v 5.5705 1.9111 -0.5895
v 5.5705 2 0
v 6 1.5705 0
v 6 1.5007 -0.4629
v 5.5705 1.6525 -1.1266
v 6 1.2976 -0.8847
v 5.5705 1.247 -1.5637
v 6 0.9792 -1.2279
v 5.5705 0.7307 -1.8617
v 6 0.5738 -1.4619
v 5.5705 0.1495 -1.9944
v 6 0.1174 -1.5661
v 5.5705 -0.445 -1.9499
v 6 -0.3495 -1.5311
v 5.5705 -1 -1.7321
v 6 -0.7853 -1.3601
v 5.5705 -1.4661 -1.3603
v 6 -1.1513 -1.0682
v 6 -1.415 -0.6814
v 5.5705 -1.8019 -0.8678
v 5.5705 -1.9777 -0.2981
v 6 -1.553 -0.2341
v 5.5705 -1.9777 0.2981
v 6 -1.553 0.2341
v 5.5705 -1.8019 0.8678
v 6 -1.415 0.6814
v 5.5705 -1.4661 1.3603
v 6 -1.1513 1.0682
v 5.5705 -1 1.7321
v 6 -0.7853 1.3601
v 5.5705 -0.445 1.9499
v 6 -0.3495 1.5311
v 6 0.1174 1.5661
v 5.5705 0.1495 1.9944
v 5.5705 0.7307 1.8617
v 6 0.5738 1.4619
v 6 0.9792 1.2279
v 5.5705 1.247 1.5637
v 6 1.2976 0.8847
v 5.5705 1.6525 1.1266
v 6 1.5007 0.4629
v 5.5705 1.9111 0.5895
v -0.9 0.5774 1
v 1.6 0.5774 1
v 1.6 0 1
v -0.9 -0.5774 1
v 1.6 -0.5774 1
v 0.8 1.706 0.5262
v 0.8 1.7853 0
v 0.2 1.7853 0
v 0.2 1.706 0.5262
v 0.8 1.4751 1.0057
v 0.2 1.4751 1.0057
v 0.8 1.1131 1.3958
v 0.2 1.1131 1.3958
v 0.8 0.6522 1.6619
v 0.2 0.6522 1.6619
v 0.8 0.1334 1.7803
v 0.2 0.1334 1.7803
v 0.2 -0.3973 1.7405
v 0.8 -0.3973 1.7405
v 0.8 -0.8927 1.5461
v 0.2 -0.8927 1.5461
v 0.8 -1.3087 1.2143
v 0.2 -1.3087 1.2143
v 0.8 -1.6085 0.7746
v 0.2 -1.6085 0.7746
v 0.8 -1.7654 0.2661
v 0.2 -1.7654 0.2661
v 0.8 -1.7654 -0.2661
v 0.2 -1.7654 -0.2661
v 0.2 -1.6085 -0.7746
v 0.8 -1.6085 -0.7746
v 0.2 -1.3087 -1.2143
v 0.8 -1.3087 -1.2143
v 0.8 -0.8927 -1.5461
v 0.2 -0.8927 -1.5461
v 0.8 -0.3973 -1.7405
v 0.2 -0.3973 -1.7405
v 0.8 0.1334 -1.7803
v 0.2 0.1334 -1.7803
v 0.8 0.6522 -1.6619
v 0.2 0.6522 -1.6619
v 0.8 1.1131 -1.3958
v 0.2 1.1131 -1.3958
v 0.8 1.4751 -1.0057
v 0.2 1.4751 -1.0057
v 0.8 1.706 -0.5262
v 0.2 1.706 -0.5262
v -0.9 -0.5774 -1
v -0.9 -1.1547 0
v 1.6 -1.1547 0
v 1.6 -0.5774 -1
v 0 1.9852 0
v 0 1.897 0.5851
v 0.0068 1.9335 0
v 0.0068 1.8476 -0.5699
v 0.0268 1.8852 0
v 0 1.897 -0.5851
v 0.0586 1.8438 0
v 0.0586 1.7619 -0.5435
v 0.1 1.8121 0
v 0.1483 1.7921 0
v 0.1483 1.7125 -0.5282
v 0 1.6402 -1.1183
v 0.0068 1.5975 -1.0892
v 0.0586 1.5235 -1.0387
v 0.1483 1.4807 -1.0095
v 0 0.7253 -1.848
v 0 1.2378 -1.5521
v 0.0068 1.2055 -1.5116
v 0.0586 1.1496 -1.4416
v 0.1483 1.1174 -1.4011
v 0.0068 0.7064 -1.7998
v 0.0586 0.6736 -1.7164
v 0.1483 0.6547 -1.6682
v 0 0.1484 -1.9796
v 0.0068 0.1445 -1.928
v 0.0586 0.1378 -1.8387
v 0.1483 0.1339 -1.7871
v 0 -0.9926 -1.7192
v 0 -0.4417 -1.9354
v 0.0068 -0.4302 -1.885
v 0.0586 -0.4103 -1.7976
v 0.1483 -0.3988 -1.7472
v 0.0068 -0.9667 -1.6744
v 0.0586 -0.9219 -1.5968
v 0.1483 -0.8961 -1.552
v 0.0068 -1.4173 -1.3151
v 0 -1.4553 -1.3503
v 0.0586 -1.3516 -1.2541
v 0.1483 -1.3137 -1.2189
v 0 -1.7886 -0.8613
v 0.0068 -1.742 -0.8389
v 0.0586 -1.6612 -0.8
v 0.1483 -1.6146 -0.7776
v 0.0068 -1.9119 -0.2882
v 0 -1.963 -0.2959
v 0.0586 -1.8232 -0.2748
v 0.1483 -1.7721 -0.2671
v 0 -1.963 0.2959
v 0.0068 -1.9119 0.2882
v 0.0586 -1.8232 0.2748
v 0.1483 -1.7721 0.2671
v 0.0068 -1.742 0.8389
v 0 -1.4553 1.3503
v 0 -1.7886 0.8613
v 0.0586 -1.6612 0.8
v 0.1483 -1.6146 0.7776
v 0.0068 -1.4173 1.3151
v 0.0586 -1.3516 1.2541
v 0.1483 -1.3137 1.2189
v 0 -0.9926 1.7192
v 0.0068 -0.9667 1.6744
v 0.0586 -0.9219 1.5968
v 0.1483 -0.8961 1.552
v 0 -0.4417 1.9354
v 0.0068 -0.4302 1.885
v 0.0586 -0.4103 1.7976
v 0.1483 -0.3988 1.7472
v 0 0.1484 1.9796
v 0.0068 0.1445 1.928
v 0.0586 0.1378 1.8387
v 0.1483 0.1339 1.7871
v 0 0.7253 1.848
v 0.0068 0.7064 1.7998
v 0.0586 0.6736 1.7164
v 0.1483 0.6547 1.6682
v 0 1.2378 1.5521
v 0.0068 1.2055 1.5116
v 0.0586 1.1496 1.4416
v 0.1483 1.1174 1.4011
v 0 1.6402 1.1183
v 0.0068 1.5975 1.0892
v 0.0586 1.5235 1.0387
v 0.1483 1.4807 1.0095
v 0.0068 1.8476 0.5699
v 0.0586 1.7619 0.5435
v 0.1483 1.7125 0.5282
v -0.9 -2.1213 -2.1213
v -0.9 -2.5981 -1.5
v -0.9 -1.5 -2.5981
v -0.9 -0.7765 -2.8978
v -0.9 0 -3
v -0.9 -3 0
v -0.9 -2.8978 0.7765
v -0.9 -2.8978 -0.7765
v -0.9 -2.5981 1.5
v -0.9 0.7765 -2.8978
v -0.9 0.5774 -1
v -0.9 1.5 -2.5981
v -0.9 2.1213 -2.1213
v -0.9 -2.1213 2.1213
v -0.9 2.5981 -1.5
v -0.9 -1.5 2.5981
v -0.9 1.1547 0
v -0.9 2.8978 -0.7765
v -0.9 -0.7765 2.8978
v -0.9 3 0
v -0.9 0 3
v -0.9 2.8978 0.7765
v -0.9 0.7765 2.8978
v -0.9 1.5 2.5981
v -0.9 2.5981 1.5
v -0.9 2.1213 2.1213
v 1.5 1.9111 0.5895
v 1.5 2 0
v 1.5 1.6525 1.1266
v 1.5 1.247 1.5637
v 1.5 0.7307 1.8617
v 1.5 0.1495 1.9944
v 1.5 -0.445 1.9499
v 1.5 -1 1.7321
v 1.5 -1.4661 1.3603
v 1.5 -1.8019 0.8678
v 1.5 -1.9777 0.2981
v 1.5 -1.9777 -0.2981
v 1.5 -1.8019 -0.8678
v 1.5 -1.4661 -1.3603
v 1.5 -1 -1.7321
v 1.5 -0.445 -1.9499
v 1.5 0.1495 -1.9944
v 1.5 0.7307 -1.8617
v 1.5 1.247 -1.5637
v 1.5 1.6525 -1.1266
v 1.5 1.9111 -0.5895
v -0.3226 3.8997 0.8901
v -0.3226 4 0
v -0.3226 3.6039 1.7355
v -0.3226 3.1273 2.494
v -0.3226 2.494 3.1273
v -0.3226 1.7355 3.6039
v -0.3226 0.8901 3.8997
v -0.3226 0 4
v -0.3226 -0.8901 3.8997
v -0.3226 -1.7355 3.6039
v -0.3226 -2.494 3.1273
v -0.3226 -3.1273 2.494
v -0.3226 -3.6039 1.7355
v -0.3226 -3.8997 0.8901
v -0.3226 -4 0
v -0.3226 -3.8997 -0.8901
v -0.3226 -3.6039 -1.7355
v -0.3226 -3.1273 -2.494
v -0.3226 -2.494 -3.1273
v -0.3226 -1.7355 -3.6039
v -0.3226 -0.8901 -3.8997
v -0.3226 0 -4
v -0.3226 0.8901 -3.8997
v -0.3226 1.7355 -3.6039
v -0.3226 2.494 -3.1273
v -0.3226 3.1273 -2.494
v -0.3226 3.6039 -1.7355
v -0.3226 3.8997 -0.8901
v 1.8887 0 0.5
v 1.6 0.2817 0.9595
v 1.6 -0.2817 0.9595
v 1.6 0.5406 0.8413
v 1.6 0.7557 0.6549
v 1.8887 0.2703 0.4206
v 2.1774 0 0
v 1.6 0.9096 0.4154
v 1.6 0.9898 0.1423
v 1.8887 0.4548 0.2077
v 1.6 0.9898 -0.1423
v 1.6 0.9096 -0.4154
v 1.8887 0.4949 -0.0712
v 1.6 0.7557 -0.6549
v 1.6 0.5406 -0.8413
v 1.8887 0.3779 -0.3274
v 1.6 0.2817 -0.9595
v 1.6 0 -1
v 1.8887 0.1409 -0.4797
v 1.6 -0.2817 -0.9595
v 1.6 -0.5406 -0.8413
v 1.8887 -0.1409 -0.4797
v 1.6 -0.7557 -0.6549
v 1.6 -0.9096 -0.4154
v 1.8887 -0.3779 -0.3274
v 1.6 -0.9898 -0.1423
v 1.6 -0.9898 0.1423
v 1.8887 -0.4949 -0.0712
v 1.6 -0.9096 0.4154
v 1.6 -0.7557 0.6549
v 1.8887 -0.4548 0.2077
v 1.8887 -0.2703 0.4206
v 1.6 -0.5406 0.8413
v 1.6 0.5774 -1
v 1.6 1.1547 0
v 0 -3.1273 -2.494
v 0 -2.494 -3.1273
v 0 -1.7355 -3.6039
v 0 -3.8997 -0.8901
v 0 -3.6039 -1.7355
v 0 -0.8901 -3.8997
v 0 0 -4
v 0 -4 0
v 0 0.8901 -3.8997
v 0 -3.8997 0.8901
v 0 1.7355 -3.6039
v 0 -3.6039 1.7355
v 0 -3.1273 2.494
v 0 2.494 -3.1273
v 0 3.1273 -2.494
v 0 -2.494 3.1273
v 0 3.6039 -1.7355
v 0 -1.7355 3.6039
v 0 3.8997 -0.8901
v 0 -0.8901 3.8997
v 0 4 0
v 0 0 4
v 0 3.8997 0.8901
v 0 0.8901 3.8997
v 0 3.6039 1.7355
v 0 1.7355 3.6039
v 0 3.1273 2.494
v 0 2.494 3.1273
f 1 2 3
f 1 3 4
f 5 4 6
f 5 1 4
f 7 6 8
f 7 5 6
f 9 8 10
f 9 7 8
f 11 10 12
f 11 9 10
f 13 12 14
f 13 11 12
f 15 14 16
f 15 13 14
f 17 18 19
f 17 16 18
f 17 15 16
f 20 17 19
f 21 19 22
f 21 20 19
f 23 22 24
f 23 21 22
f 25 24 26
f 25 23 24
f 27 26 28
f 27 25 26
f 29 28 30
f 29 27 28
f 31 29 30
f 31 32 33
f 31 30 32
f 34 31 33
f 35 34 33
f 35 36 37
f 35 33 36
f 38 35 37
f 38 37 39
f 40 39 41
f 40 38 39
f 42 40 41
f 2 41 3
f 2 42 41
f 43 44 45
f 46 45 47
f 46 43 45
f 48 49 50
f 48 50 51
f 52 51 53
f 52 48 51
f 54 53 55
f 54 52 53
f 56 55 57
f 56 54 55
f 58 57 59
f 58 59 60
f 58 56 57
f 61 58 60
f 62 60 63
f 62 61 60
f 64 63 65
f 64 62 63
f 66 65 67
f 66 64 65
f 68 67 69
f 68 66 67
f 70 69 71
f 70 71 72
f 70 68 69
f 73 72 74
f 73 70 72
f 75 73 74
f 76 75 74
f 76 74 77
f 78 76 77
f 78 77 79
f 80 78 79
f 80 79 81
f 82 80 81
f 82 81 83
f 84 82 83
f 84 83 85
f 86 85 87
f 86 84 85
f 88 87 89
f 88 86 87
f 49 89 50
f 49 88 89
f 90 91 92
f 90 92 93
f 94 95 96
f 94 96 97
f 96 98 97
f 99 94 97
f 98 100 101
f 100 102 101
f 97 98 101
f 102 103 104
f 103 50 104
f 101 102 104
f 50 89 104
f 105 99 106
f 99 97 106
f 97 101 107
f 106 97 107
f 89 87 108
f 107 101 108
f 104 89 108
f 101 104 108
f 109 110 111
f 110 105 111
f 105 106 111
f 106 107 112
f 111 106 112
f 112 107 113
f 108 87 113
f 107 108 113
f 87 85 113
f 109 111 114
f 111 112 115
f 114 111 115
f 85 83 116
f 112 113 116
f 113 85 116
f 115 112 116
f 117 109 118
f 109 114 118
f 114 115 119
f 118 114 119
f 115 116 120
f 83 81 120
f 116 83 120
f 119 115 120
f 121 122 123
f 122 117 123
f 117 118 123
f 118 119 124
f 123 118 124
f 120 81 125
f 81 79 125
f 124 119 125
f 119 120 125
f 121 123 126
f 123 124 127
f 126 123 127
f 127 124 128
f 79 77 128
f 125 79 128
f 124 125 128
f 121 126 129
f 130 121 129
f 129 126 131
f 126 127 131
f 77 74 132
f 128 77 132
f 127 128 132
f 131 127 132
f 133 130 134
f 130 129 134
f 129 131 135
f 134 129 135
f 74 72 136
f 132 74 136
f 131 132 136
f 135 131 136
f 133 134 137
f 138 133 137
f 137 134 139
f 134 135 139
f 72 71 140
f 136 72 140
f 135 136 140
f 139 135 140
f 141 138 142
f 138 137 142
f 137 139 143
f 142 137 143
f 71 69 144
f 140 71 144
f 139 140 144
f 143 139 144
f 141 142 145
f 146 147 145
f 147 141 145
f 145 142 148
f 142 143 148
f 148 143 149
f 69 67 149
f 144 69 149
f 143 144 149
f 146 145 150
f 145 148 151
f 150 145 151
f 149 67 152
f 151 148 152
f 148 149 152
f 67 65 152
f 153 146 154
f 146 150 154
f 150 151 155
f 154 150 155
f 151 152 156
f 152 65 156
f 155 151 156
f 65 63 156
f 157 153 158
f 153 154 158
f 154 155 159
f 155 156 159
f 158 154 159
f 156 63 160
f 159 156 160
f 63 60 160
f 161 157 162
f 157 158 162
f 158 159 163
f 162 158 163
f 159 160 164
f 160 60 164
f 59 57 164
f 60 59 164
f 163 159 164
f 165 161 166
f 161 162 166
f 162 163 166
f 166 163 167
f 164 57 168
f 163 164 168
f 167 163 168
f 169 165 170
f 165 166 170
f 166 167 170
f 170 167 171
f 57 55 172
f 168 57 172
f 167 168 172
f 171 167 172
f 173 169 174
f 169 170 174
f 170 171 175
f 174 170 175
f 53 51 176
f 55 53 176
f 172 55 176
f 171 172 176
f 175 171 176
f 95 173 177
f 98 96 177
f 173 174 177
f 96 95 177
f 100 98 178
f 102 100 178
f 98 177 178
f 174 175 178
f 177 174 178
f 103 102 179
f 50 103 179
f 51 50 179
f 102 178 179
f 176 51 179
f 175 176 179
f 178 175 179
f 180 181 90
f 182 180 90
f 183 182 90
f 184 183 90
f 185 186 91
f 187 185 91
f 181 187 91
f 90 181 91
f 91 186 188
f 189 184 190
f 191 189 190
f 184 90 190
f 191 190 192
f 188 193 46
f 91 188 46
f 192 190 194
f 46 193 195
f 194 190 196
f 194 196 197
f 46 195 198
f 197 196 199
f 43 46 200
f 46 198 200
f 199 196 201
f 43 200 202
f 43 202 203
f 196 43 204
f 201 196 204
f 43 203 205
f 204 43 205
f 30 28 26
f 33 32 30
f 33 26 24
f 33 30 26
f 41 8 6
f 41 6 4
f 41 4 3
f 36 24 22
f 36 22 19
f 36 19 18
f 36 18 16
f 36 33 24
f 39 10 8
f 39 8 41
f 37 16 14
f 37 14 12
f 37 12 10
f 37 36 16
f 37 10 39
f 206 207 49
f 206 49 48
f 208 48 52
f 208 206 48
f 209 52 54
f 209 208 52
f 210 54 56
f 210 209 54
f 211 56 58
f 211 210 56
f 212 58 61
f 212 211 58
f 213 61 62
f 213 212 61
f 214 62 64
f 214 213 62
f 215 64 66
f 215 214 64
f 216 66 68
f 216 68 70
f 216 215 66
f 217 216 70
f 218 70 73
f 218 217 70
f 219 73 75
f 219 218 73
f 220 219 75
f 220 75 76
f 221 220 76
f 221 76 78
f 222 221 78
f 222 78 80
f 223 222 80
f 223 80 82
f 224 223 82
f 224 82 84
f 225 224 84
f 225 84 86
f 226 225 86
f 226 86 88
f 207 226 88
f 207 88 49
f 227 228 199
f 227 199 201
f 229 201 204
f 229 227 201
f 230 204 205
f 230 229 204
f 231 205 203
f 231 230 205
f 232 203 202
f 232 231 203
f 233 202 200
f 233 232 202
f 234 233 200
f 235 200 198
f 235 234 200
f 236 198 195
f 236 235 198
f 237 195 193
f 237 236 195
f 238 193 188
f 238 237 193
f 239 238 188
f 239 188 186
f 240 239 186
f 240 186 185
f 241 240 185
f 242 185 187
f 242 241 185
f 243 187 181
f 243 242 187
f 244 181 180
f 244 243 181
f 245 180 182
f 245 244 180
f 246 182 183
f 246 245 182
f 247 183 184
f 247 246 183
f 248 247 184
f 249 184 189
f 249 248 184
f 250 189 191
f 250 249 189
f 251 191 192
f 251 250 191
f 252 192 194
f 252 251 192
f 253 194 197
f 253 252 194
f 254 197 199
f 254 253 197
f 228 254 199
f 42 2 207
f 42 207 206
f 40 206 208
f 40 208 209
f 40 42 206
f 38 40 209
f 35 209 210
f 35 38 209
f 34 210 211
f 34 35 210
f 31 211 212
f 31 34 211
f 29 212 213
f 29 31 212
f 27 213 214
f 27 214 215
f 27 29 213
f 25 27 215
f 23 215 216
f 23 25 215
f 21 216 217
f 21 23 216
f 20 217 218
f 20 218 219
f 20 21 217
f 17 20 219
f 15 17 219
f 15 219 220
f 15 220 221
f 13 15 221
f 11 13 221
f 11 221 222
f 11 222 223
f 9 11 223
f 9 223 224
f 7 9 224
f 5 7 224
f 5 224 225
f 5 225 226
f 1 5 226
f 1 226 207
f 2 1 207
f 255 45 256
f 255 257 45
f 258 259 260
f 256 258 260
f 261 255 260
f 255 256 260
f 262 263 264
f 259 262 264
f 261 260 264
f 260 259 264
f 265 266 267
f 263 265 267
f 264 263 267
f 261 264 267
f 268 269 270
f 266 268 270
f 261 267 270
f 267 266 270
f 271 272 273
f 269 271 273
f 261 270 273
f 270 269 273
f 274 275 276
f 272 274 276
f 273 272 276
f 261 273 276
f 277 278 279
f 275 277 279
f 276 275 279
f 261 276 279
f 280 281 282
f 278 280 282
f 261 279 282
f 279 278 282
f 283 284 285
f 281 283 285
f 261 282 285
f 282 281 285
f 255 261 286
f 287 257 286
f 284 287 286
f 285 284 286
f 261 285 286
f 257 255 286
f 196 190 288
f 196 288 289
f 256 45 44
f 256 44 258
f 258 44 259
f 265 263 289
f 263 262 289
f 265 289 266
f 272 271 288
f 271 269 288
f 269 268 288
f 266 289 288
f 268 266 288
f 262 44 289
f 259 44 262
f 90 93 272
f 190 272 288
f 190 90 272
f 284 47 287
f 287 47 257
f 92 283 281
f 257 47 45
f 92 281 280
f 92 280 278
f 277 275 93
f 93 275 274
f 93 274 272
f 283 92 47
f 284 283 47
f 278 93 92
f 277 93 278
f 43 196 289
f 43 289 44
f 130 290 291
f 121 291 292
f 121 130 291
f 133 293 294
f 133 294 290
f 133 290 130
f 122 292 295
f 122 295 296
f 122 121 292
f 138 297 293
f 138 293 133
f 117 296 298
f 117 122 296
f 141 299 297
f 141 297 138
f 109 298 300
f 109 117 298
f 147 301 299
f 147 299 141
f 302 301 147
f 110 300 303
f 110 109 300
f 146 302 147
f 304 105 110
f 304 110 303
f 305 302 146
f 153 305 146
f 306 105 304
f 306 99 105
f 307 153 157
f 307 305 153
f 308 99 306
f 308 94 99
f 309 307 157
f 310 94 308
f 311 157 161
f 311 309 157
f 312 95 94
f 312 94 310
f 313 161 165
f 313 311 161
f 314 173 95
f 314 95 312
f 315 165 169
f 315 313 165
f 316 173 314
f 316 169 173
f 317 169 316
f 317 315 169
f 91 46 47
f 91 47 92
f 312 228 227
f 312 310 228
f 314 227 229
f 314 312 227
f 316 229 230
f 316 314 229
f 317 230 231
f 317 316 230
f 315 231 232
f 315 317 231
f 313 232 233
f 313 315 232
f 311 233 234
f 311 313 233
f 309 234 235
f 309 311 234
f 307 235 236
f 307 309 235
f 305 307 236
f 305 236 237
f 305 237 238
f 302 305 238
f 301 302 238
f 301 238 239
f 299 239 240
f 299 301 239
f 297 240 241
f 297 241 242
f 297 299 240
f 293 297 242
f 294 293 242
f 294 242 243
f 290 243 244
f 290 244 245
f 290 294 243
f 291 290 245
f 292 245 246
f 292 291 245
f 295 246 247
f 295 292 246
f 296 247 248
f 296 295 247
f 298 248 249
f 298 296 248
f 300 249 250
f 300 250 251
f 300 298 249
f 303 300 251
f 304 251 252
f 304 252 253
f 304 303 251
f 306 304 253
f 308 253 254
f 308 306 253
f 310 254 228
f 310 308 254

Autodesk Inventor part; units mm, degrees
ref_plane "YZ Plane" through (0, 0, 0) normal (1, 0, 0) x (0, 1, 0)
ref_plane "XZ Plane" through (0, 0, 0) normal (0, 1, 0) x (-1, 0, 0)
ref_plane "XY Plane" through (0, 0, 0) normal (0, 0, 1) x (1, 0, 0)
sketch "Sketch_1" plane through (0, 0, 0) normal (0, 0, 1) x (1, 0, 0)
  line L0 (6, 0) -> (-0.9, 0)
  line L1 (-0.9, 0) -> (-0.9, 3)
  line L2 (-0.9, 3) -> (-0.3226, 4)
  line L3 (-0.3226, 4) -> (0, 4)
  line L4 (0, 4) -> (0, 1.9852)
  arc A0 (0, 1.9852) -> (0.2, 1.7853) centre (0.2, 1.9853) ccw
  line L5 (0.2, 1.7853) -> (0.8, 1.7853)
  line L6 (0.8, 1.7853) -> (1.5, 2)
  line L7 (1.5, 2) -> (5.5705, 2)
  line L8 (5.5705, 2) -> (6, 1.5705)
  line L9 (6, 1.5705) -> (6, 0)
  line L10 (6, 0) -> (-0.9, 0)
revolve "Revolution1" add sketch "Sketch_1" angle 360 about axis through (6, 0, 0) along (1, 0, 0)
thread "Thread1" size "M4x0.7" class "6g" standard "ISO Metric profile" full length
sketch "Sketch2" plane through (-0.9, 0, 0) normal (-1, 0, 0) x (0, 0, 1)
  point P0 (0, 0)
hole "Hole1" at (-0.9, 0, 0) direction (1, 0, 0) diameter 2 depth 2.5 tip angle 120
sketch "Sketch_3" plane through (-0.9, 0, 0) normal (1, 0, 0) x (0, 0, -1)
  line L0 (-1, -0.5774) -> (0, -1.1547)
  line L1 (0, -1.1547) -> (1, -0.5774)
  line L2 (1, -0.5774) -> (1, 0.5774)
  line L3 (1, 0.5774) -> (0, 1.1547)
  line L4 (0, 1.1547) -> (-1, 0.5774)
  line L5 (-1, 0.5774) -> (-1, -0.5774)
extrude "Extrusion1" cut sketch "Sketch_3" along normal blind 2.5
properties part number "CBSTSR4-6" material "鋼、炭素鋼"
